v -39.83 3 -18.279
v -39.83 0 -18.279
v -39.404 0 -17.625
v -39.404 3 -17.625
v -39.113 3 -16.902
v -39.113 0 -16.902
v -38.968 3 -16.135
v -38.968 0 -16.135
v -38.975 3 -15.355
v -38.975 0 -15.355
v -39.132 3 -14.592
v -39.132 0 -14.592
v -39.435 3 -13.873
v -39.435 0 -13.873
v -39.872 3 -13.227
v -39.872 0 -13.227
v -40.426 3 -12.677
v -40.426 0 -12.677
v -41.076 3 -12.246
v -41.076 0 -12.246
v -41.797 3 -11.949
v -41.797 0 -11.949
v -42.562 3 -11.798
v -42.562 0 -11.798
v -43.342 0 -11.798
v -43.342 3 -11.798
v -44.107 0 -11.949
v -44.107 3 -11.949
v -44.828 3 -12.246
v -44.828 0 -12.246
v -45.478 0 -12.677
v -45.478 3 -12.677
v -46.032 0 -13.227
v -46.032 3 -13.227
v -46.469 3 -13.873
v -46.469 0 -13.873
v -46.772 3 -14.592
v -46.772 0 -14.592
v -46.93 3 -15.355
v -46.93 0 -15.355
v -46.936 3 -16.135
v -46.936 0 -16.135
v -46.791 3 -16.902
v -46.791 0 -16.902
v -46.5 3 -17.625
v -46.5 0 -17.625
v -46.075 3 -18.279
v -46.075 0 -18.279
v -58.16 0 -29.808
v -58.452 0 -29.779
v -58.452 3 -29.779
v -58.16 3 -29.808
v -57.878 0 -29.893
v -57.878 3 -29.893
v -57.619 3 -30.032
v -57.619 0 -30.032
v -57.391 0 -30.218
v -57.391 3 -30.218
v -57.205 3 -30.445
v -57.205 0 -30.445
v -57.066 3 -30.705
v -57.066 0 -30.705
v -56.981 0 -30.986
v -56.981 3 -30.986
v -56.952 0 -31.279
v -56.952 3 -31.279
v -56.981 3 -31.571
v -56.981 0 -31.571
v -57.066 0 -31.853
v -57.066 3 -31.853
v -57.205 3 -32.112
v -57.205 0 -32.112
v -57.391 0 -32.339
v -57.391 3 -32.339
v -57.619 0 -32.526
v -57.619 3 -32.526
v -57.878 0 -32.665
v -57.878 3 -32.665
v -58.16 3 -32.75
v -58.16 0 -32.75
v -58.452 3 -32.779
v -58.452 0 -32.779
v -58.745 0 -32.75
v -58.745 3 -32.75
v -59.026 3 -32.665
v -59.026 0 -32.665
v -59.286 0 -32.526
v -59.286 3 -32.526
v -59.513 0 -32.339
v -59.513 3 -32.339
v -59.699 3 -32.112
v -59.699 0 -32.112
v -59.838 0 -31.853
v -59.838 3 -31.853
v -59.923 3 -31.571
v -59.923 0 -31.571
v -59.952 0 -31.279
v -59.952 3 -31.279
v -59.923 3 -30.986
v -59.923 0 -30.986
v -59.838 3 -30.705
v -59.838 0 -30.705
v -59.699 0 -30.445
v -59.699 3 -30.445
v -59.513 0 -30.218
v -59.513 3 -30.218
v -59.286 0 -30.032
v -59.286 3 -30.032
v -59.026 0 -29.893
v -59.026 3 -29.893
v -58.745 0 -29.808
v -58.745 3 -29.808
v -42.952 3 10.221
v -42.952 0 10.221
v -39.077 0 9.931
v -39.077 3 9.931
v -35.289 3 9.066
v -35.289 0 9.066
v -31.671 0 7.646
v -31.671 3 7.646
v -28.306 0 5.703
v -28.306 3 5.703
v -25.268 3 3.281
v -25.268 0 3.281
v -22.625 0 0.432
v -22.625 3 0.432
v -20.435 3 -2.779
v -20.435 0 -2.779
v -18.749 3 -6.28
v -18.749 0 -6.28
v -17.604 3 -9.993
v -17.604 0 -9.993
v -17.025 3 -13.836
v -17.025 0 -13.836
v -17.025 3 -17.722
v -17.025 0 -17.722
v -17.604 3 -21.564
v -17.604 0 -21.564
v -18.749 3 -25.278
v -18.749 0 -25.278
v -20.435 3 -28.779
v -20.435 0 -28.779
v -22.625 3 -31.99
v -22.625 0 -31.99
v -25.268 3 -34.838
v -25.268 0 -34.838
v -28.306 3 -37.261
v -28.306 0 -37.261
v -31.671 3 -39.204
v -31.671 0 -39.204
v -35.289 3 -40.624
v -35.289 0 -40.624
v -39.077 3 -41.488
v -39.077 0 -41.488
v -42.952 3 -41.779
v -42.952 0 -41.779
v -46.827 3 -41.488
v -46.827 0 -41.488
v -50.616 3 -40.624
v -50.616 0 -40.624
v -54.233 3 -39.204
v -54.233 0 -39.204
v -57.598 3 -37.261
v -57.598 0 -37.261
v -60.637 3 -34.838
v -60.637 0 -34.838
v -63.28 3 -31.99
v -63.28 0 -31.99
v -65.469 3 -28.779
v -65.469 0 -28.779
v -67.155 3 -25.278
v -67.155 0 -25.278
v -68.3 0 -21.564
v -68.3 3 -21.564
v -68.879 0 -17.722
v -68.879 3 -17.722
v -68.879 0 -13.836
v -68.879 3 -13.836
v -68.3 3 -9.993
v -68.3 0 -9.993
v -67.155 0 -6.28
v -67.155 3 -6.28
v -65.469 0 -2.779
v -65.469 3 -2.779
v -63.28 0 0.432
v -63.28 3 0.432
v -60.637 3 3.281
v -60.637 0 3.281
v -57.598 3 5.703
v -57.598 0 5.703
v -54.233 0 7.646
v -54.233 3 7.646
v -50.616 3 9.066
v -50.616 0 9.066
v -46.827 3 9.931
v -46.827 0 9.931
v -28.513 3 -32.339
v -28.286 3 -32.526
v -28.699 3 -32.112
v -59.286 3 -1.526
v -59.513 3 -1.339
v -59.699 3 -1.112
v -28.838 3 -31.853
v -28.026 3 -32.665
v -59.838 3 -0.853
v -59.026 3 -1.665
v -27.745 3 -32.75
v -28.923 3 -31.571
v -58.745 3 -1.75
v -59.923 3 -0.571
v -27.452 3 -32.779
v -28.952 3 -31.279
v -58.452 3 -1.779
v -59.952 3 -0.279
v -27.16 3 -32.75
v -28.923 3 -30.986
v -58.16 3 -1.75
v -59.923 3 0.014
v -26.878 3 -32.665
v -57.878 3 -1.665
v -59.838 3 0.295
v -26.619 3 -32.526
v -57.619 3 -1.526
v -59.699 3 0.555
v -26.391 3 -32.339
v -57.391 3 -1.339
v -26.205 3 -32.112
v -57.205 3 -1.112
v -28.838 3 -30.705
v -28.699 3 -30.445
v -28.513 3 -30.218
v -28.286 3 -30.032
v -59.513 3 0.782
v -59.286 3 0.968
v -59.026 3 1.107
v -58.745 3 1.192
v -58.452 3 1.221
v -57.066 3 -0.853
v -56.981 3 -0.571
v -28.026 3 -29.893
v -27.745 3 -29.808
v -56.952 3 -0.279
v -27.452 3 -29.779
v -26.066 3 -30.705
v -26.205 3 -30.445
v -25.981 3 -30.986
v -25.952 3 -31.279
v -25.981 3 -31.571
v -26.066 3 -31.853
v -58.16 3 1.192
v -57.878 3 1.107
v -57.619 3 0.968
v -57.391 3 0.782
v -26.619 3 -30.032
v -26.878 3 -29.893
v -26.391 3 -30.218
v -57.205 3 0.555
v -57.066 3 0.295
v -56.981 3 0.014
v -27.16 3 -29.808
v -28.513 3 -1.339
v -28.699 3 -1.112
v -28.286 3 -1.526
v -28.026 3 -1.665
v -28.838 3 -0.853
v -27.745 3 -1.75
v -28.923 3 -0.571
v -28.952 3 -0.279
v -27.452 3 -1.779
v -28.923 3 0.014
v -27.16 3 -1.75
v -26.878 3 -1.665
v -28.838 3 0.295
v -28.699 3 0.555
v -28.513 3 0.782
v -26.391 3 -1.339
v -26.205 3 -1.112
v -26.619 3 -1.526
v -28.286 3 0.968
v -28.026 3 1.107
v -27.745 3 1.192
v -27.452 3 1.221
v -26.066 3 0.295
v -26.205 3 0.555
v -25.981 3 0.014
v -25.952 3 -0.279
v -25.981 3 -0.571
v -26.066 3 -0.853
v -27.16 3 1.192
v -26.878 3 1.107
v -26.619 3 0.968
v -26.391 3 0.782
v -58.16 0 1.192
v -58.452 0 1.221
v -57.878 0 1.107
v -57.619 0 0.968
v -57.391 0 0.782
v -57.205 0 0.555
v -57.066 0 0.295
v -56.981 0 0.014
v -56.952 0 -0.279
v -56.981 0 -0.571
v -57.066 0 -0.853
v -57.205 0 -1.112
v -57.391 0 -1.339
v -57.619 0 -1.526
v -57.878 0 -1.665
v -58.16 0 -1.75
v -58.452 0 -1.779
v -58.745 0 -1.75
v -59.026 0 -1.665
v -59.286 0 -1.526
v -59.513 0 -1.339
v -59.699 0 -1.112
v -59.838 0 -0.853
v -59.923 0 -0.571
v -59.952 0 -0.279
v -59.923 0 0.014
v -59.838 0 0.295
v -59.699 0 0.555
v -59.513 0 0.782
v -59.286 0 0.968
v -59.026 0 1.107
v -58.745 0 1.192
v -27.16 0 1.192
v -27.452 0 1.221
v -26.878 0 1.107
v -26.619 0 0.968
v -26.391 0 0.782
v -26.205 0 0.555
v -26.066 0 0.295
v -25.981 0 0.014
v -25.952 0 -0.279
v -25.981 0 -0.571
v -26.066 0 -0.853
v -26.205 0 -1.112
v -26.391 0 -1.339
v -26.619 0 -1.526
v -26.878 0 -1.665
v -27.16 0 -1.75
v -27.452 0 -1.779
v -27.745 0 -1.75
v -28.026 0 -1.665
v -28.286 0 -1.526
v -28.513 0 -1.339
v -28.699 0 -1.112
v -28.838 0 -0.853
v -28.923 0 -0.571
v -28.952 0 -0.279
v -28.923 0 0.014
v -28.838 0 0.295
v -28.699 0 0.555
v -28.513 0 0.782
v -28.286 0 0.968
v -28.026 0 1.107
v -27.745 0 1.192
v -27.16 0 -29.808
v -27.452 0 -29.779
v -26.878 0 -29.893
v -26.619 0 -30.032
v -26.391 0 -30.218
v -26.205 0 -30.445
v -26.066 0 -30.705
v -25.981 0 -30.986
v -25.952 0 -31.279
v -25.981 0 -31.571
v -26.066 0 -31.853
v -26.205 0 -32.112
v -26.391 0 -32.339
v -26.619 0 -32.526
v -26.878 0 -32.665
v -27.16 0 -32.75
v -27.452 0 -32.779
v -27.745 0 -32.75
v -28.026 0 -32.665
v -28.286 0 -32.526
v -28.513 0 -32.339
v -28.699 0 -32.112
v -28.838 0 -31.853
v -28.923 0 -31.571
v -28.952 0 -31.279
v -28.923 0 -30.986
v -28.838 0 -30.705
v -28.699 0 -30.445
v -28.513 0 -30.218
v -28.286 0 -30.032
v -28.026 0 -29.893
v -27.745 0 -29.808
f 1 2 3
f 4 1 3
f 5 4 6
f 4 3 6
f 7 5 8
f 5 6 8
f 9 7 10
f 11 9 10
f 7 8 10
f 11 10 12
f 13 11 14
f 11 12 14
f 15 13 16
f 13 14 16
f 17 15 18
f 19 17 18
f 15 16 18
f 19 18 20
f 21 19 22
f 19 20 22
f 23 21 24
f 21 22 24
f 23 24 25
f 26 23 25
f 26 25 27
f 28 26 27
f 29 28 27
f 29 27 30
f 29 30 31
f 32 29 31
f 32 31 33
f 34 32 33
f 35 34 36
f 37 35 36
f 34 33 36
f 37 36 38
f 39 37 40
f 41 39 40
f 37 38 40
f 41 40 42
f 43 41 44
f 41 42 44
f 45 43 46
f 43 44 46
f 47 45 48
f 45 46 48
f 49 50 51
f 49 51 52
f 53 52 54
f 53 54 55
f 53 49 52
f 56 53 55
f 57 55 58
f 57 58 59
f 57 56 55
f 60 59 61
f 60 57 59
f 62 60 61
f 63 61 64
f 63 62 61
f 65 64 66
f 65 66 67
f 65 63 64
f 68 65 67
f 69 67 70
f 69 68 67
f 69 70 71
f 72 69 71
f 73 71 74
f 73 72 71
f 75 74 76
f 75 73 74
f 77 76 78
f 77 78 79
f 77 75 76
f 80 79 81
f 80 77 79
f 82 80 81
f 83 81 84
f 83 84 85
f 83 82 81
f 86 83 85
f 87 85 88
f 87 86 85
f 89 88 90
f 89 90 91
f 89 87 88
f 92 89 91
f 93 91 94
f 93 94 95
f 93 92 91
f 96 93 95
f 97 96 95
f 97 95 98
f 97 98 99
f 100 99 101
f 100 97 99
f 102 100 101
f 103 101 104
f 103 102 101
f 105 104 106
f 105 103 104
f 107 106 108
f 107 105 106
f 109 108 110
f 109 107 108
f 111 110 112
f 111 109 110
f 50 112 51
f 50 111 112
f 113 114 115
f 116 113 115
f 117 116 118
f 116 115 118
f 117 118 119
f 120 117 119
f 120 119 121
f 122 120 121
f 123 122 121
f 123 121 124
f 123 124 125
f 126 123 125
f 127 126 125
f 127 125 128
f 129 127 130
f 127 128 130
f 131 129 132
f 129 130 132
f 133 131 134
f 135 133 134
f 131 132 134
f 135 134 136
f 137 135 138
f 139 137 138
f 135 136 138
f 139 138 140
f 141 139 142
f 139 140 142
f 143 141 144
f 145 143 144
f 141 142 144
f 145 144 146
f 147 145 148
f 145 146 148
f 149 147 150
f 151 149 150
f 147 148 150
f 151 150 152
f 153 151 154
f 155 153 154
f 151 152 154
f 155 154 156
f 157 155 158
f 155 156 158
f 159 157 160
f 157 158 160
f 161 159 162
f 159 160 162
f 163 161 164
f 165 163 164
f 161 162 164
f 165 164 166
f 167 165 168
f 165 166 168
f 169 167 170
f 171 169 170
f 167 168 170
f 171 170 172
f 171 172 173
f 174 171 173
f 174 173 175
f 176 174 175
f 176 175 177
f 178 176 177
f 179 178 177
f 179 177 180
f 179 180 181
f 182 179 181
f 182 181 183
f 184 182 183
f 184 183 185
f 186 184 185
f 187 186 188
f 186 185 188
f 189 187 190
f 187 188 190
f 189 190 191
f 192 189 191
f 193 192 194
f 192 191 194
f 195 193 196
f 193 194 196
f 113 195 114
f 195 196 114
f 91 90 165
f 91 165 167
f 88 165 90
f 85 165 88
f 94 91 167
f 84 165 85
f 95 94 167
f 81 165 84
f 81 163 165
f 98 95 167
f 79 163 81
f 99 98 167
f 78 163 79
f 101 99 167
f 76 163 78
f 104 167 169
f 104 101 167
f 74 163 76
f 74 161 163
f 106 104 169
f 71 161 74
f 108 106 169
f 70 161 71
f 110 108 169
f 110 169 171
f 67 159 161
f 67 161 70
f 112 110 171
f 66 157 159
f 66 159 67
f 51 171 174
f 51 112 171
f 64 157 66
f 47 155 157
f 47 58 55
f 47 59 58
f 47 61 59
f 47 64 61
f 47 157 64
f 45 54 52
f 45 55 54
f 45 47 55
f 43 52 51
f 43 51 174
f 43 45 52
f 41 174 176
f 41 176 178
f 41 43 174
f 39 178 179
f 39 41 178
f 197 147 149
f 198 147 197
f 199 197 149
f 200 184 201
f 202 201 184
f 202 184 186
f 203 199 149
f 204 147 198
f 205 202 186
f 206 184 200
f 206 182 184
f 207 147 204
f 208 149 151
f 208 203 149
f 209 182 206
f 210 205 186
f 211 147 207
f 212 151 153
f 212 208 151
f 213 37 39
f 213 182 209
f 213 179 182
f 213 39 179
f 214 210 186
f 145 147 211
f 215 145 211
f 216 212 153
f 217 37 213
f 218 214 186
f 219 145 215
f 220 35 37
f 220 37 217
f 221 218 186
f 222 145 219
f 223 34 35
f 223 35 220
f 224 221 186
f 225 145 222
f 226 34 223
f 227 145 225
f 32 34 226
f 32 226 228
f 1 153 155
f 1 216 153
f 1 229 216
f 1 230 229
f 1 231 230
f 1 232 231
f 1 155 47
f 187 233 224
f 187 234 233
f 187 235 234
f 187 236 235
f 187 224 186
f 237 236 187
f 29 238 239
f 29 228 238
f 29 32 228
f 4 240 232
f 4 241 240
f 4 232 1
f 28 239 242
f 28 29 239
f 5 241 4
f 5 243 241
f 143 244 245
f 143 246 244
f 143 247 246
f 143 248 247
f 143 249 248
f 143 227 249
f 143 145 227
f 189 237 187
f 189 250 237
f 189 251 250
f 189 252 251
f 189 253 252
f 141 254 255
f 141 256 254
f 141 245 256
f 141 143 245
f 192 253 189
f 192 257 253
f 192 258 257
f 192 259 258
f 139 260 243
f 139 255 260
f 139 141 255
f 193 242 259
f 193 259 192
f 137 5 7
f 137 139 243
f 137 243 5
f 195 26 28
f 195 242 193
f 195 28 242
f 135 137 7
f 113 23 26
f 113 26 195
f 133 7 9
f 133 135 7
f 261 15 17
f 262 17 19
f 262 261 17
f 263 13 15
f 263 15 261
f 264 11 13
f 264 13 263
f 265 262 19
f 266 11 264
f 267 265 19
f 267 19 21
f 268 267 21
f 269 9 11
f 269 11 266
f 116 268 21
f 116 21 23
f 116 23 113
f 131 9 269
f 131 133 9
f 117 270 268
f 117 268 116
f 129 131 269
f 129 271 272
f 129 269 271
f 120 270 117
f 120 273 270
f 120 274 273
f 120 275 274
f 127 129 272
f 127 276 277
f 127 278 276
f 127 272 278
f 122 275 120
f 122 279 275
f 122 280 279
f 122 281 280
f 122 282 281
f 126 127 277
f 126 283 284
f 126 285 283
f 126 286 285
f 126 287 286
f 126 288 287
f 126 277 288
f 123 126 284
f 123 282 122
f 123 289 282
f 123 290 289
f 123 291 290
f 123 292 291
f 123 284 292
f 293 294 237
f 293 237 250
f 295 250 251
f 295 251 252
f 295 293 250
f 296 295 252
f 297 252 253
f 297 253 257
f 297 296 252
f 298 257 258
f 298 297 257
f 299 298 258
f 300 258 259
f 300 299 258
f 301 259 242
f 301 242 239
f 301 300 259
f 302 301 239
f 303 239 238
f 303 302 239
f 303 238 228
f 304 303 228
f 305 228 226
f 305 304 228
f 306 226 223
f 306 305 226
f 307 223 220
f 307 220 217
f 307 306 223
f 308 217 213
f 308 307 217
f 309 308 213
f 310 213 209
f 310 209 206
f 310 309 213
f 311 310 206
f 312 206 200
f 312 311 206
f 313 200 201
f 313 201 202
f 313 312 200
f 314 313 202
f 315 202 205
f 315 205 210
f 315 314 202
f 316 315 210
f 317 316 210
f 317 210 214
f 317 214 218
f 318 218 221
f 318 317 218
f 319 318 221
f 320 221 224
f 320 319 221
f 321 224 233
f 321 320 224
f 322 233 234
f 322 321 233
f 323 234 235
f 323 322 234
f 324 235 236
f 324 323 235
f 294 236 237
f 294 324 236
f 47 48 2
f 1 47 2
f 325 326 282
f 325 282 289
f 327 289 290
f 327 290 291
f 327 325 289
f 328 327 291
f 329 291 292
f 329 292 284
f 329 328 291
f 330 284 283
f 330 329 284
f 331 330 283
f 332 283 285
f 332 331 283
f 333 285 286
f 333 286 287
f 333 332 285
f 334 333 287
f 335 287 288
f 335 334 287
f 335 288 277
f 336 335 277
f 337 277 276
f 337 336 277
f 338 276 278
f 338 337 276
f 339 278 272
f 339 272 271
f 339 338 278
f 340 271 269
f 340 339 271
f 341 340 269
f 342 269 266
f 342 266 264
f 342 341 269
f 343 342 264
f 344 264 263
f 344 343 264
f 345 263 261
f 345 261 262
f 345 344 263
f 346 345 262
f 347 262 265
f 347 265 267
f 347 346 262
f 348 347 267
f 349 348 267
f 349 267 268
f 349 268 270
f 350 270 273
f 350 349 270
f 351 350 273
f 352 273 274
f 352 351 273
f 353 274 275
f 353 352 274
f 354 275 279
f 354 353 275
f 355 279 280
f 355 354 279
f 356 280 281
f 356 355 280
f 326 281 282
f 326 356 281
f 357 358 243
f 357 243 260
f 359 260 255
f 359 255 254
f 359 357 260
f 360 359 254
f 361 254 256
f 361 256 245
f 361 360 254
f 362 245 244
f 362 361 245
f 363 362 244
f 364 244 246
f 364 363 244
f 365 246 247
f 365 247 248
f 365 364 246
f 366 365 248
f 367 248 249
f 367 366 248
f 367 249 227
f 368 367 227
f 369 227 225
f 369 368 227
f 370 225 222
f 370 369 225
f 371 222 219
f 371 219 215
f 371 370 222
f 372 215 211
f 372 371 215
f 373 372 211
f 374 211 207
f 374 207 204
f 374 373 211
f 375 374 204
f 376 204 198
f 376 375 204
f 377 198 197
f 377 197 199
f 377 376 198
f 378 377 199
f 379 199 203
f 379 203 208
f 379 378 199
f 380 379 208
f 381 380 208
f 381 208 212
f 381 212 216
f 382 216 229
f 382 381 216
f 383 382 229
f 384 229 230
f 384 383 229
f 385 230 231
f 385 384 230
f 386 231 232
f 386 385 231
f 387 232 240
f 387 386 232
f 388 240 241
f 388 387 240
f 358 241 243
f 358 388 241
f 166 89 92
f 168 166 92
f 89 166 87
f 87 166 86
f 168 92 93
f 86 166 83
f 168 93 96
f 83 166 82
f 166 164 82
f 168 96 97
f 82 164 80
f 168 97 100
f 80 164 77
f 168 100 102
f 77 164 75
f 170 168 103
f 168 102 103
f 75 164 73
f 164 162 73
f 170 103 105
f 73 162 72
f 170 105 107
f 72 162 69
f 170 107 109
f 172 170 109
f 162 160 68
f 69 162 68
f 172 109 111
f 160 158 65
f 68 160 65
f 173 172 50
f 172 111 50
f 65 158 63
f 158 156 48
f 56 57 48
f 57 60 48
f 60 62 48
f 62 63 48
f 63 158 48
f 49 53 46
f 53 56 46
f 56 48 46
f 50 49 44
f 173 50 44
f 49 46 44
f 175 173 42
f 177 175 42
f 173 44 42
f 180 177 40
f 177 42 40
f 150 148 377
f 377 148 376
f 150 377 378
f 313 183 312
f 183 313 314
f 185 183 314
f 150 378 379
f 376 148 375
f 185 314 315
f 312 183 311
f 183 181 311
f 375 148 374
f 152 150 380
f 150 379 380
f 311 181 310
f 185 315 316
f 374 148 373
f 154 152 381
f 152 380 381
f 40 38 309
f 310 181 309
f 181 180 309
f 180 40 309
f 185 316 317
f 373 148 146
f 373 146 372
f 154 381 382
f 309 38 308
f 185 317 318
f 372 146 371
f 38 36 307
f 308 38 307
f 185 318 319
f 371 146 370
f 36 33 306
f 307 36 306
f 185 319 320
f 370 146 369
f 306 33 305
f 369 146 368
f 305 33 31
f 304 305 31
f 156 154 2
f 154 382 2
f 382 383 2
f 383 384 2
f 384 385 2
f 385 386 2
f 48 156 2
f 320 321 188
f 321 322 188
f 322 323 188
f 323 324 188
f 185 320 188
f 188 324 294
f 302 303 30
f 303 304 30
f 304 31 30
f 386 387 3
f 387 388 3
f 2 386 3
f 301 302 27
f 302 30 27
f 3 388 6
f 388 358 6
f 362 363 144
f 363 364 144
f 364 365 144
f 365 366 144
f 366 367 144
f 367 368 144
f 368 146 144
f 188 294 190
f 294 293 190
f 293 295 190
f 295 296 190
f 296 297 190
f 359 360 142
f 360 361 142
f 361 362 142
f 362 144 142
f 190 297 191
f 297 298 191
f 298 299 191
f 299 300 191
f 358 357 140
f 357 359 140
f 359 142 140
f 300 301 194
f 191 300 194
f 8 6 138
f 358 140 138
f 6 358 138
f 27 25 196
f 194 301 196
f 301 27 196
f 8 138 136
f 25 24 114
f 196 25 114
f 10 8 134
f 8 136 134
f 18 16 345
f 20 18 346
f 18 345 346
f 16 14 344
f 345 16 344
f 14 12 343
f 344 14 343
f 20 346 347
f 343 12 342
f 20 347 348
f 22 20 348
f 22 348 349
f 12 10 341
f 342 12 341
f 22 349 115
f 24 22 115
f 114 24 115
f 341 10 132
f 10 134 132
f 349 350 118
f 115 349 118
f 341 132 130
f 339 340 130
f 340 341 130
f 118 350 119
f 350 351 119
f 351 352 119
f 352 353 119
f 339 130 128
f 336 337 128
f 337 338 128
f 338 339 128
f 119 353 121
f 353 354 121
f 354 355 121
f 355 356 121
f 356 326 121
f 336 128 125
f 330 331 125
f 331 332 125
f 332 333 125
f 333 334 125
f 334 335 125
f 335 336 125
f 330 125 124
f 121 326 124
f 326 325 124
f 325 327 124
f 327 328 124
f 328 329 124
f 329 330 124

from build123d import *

# Parameters (mm, degrees)
SKETCH_1_R      = 26
SKETCH_1_R_2    = 1.5
EXTRUDE_1_DEPTH = 3


with BuildPart() as part:
    # Эскиз1 → Бобышка-Вытянуть1 (new body)
    with BuildSketch(Plane(origin=(0, 0, 0), x_dir=(1, 0, 0), z_dir=(0, 1, 0))):
        with Locations(Location((-42.952158514, 15.778810529, 0), (0, 0, 270))):
            Circle(SKETCH_1_R)
        with Locations(Location((-58.452158514, 31.278810529, 0), (0, 0, 270))):
            Circle(SKETCH_1_R_2, mode=Mode.SUBTRACT)
        with Locations(Location((-58.452158514, 0.278810529, 0), (0, 0, 270))):
            Circle(SKETCH_1_R_2, mode=Mode.SUBTRACT)
        with Locations(Location((-27.452158514, 31.278810529, 0), (0, 0, 270))):
            Circle(SKETCH_1_R_2, mode=Mode.SUBTRACT)
        with Locations(Location((-27.452158514, 0.278810529, 0), (0, 0, 270))):
            Circle(SKETCH_1_R_2, mode=Mode.SUBTRACT)
        with BuildLine():
            Line((-46.074657514, 18.278810529), (-39.829659515, 18.278810529))
            ThreePointArc((-39.829659515, 18.278810529), (-42.952158514, 11.778810529), (-46.074657514, 18.278810529))
        make_face(mode=Mode.SUBTRACT)
    extrude(amount=EXTRUDE_1_DEPTH)


solid = part.part
